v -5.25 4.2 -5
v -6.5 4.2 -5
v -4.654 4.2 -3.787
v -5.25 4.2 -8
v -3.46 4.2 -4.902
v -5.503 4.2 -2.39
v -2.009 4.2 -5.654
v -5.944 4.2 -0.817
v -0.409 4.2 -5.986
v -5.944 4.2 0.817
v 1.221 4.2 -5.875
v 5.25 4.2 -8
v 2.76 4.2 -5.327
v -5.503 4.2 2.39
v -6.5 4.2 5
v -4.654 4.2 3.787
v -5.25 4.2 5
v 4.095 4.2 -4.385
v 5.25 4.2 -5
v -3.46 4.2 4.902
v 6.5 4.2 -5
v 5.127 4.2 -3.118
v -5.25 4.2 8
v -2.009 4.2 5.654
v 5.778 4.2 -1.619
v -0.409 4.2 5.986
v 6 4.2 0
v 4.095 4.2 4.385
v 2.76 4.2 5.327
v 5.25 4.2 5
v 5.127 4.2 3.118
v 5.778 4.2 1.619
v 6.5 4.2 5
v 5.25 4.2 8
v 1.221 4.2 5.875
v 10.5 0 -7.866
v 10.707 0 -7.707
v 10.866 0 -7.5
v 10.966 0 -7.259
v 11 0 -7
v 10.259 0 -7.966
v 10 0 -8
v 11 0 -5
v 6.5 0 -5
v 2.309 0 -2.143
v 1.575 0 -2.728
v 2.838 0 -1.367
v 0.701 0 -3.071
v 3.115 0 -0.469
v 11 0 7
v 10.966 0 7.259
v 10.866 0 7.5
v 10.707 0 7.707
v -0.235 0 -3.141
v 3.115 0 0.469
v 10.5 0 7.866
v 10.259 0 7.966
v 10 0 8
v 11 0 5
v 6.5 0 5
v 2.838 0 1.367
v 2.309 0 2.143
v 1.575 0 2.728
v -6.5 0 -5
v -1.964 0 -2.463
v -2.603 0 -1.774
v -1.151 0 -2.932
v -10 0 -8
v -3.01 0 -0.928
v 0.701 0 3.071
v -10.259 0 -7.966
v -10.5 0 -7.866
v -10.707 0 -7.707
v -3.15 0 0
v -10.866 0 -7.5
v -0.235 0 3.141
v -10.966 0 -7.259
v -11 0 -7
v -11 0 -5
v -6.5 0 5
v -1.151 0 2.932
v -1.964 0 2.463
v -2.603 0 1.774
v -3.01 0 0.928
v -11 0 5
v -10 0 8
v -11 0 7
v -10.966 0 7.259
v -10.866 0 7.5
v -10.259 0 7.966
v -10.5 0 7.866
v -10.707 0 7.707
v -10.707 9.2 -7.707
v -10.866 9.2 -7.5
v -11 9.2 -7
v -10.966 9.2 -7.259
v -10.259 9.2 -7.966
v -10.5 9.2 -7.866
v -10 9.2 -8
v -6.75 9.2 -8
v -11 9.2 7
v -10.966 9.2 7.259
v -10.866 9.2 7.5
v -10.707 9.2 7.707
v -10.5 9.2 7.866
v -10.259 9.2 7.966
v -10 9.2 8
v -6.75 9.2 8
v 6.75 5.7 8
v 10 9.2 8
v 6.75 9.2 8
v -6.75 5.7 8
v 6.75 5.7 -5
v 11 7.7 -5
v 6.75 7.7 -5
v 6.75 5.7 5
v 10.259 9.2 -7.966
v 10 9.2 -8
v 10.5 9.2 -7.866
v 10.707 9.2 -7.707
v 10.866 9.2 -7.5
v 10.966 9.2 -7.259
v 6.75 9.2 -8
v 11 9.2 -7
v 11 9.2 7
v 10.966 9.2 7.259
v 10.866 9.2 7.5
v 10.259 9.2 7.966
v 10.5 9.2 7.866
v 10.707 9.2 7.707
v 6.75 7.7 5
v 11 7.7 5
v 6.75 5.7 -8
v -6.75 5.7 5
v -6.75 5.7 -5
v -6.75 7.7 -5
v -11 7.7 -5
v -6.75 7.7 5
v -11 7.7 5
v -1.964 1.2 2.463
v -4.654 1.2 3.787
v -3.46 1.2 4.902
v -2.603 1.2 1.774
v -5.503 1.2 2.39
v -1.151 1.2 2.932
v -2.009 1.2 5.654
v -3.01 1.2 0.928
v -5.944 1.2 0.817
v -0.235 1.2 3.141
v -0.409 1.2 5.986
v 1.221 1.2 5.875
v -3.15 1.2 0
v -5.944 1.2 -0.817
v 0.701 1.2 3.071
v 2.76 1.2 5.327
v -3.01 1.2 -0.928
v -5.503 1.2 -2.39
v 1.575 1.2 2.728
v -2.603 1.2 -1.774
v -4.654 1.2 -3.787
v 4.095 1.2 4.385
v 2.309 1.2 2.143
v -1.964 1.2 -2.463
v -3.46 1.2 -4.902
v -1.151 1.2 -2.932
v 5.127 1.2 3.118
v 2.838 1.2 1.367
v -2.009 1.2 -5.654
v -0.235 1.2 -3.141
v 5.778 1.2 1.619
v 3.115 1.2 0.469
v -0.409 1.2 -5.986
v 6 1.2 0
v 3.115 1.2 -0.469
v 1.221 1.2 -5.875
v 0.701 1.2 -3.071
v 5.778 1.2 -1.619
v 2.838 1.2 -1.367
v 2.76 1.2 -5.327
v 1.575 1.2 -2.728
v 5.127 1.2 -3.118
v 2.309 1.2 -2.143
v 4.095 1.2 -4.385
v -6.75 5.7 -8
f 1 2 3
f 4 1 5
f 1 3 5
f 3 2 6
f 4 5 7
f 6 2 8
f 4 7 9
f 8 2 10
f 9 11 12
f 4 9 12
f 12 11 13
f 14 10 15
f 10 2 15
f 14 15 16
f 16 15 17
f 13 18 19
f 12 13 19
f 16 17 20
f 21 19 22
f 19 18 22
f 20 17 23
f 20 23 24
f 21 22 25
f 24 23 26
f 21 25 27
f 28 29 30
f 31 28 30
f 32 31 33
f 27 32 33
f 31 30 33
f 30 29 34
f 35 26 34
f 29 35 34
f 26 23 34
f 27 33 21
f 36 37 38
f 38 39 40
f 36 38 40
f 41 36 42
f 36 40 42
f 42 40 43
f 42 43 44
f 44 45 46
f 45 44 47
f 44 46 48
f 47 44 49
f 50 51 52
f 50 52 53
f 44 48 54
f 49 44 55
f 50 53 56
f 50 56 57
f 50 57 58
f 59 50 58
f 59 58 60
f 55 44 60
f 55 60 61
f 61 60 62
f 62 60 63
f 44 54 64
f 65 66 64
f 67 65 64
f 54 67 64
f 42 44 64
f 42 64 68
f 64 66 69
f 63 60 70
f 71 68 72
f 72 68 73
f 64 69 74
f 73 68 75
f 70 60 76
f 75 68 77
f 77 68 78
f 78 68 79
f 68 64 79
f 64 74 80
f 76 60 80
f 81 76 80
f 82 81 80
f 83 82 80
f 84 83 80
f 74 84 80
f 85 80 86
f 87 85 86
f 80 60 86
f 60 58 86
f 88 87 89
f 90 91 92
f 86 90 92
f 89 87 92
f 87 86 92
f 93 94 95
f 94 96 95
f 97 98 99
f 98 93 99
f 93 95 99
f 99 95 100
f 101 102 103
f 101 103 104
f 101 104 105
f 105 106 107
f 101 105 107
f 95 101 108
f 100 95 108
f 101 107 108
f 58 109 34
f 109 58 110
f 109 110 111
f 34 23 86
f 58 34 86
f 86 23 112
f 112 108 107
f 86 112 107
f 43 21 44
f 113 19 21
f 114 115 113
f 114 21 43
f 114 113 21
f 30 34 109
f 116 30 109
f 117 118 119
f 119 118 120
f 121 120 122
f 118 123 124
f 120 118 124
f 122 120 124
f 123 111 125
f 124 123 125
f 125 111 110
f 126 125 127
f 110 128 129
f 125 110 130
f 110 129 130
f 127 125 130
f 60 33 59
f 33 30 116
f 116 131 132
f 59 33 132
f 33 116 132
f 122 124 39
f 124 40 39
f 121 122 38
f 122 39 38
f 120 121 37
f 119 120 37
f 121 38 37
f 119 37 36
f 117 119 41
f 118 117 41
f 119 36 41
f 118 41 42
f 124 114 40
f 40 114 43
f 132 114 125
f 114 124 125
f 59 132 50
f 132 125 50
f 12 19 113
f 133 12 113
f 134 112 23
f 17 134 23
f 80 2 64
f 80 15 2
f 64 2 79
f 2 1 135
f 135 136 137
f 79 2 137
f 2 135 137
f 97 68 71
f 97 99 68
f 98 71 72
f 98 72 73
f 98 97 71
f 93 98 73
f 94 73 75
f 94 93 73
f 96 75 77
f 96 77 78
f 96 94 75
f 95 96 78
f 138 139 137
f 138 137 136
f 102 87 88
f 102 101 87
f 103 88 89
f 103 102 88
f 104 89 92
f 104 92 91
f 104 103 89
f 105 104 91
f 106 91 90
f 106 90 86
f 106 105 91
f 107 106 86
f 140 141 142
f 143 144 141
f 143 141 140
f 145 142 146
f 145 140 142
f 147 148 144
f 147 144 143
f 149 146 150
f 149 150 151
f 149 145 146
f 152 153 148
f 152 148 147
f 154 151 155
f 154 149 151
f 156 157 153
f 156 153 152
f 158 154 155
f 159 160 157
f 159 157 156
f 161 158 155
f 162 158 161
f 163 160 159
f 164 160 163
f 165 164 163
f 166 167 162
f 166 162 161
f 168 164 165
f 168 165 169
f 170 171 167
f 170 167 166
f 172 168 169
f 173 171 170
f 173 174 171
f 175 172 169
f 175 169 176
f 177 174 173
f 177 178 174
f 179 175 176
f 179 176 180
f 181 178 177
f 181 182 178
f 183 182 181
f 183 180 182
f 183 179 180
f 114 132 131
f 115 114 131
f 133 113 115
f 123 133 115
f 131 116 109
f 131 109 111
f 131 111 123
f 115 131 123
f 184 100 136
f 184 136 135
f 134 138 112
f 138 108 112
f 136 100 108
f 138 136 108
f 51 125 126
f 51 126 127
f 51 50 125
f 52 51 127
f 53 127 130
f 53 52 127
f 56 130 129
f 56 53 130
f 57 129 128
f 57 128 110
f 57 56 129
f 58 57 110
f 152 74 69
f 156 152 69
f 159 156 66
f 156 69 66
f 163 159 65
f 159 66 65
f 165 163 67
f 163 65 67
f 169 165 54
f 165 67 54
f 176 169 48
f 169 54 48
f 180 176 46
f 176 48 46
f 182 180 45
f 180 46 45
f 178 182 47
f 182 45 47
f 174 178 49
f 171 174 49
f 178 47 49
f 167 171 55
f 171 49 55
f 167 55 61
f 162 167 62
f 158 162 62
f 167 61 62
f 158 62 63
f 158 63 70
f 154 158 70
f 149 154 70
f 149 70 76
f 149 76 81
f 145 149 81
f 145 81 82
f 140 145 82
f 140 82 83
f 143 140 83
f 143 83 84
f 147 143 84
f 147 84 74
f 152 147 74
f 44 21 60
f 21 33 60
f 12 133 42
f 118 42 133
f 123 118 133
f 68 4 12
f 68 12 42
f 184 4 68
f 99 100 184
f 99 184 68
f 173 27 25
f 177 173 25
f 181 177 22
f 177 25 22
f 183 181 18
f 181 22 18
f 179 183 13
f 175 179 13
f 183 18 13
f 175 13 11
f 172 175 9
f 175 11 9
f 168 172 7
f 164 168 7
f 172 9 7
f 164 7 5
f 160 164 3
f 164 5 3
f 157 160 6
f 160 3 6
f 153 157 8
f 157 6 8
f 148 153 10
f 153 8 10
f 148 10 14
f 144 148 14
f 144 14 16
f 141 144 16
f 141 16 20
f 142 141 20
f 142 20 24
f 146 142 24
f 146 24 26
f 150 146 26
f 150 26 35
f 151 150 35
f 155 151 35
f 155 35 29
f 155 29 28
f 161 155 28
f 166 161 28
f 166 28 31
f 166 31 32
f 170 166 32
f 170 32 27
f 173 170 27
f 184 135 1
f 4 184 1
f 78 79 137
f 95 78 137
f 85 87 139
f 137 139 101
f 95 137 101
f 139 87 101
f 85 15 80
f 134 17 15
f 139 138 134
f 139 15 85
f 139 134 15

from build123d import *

# Parameters (mm, degrees)
EXTRUDE_1_DEPTH             = 8
CUT_EXTRUDE_1_DEPTH         = 5
HOLE_WIZARD_M61_D           = 6.3
HOLE_WIZARD_M61_DEPTH       = 4.2
HOLE_WIZARD_M61_CBORE_D     = 12
HOLE_WIZARD_M61_CBORE_DEPTH = 3
FILLET_1_R                  = 1


with BuildPart() as part:
    # Эскиз1 → Бобышка-Вытянуть1 (new body, symmetric)
    with BuildSketch(Plane.XY):
        Polygon((11, 0), (-11, 0), (-11, 9.2), (-6.75, 9.2), (-6.75, 5.7), (-5.25, 4.2), (5.25, 4.2), (6.75, 5.7), (6.75, 9.2), (11, 9.2), align=None)
    extrude(amount=EXTRUDE_1_DEPTH, both=True)

    # Эскиз2 → Вырез-Вытянуть1 (cut, symmetric)
    with BuildSketch(Plane.XY):
        Polygon((-11, 7.7), (-6.75, 7.7), (-6.75, 5.7), (-5.25, 4.2), (-6.5, 4.2), (-6.5, 0), (-11, 0), align=None)
    cut_extrude_1 = extrude(amount=CUT_EXTRUDE_1_DEPTH, both=True, mode=Mode.SUBTRACT)

    # Зеркальное отражение1: Вырез-Вытянуть1 across plane
    add(cut_extrude_1.mirror(Plane(origin=(0, 0, 0), x_dir=(0, 0, 1), z_dir=(1, 0, 0))), mode=Mode.SUBTRACT)

    # Цековка для  болта с шестигранной головкой M61
    with Locations(Plane(origin=(0, 4.2, 0), x_dir=(1, 0, 0), z_dir=(0, 1, 0))):
        with Locations((0, 0)):
            CounterBoreHole(HOLE_WIZARD_M61_D / 2, HOLE_WIZARD_M61_CBORE_D / 2, HOLE_WIZARD_M61_CBORE_DEPTH, depth=HOLE_WIZARD_M61_DEPTH)

    # Скругление1
    fillet_1_edges = [part.edges().sort_by_distance(p)[0] for p in [
        (11, 4.6, 8),
        (11, 4.6, -8),
        (-11, 4.6, -8),
        (-11, 4.6, 8),
    ]]
    fillet(fillet_1_edges, radius=FILLET_1_R)


solid = part.part
